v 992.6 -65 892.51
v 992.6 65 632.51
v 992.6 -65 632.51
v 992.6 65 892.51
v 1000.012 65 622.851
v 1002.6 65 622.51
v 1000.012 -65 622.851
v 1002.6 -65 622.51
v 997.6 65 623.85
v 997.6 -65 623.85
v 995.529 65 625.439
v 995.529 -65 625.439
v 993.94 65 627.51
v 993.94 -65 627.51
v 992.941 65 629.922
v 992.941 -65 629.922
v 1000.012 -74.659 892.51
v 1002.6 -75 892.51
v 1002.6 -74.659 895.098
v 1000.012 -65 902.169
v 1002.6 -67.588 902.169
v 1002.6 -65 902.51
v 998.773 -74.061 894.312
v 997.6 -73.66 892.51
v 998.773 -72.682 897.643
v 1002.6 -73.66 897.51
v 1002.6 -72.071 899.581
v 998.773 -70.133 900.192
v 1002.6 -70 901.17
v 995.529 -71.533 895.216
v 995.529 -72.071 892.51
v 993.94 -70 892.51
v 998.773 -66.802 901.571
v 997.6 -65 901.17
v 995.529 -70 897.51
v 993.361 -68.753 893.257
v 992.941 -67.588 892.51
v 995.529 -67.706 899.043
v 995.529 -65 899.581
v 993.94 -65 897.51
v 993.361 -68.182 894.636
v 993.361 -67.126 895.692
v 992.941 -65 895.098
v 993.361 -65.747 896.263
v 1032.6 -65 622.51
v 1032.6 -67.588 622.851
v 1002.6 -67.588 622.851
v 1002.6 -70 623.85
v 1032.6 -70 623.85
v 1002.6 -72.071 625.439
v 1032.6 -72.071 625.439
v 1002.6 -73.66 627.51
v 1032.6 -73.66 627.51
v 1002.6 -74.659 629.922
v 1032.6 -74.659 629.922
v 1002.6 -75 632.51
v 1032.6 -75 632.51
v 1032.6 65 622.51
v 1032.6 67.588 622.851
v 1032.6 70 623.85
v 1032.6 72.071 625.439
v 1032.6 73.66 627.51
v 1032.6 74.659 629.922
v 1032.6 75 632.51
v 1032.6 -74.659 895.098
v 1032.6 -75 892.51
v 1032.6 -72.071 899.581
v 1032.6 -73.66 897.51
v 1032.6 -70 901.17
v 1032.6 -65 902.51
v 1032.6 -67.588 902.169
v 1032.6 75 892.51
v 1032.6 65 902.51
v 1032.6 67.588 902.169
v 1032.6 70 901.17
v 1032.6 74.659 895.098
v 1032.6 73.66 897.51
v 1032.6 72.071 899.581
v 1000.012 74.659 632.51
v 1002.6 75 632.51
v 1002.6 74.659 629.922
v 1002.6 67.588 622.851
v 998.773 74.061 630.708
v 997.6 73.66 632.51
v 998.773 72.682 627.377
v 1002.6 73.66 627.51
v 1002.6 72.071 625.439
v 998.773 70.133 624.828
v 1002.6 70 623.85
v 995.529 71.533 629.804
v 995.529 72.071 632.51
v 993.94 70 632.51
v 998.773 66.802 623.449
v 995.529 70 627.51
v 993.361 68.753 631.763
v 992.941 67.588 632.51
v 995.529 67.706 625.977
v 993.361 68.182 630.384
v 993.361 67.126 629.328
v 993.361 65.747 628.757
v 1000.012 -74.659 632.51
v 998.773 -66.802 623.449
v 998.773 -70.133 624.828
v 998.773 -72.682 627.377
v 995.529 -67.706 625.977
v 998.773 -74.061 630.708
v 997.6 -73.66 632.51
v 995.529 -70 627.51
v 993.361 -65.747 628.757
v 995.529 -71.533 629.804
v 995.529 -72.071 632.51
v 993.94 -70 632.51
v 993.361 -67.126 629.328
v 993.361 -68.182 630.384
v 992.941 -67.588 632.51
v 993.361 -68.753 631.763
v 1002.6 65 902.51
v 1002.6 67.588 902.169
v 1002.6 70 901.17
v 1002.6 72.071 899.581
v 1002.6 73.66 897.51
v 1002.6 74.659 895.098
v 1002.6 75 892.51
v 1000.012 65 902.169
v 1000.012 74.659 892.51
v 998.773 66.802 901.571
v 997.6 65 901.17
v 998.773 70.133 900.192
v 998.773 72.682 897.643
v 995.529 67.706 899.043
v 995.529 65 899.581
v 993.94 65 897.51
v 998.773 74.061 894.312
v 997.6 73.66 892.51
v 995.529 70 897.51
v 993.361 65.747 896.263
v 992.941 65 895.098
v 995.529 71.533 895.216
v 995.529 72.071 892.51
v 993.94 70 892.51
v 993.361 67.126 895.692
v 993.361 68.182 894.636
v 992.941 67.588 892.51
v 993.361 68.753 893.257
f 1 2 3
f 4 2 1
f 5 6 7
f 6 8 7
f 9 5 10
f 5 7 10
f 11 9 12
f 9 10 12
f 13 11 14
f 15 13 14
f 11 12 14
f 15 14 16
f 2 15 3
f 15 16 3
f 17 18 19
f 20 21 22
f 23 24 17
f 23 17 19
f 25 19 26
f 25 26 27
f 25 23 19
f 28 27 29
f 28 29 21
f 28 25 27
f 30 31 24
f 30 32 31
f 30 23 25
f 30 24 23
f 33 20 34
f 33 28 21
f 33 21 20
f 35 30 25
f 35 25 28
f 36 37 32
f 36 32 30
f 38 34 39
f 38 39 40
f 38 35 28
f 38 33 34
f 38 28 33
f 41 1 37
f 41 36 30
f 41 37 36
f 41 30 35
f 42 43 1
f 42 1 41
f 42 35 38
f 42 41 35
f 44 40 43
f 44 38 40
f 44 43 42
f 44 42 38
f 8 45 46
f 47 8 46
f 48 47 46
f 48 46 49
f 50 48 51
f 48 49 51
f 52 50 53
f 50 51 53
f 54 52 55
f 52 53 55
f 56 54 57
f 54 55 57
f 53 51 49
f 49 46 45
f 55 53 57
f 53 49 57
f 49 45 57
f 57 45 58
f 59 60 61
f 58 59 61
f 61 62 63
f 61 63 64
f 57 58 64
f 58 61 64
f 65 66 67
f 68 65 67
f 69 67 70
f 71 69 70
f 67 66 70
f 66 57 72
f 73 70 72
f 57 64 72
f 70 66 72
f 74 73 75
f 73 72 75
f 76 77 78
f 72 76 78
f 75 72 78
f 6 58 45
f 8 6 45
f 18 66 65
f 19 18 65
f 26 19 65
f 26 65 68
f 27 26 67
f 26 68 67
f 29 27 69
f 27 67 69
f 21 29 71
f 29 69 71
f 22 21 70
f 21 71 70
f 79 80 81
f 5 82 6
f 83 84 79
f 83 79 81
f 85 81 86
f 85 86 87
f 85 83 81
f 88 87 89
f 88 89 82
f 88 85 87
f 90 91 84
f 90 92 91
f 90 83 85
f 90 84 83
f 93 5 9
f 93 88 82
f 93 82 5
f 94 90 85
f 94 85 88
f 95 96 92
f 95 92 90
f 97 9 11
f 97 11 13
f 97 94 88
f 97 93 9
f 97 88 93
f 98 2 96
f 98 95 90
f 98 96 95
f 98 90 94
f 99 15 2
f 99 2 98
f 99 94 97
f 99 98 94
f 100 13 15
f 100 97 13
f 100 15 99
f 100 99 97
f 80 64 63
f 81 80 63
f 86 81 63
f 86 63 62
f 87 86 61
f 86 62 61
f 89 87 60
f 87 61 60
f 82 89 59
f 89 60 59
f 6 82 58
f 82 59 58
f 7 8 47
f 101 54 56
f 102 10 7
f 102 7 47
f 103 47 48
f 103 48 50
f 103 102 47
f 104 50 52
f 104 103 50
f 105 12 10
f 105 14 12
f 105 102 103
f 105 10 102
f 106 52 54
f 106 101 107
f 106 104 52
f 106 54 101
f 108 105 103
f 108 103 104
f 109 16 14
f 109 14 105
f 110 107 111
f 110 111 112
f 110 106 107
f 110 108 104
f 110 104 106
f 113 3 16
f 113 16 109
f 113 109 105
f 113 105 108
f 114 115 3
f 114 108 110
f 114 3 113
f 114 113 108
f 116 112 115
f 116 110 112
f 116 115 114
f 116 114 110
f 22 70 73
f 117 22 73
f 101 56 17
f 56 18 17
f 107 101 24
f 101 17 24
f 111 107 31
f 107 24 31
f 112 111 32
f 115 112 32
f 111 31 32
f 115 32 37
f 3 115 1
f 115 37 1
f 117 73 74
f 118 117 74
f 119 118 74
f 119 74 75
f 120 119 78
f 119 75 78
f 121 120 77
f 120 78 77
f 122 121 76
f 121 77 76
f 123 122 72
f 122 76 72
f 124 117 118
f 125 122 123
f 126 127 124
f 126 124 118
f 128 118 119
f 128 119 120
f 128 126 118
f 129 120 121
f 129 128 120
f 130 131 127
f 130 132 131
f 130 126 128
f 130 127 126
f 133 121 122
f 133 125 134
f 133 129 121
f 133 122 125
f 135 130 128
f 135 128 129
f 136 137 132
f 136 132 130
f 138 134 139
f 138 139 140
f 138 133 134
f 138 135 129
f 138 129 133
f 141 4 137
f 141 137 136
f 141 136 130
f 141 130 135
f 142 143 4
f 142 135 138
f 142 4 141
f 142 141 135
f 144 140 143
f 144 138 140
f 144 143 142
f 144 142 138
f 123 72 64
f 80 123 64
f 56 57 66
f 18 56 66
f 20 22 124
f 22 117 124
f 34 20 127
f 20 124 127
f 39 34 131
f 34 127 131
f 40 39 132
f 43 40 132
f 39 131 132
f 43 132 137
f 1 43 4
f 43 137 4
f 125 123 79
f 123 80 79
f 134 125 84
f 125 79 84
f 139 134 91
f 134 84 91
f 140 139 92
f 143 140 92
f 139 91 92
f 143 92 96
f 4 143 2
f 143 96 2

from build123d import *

# Parameters (mm, degrees)
DODANIE_WYCI_GNI_CIE1_DEPTH = 40
ZAOKR_GLENIE1_R             = 10


with BuildPart() as part:
    # Szkic1 → Dodanie-wyciągnięcie1 (new body)
    with BuildSketch(Plane.ZY.offset(-1032.6)):
        with BuildLine():
            Line((622.51, 65), (622.51, -65))
            ThreePointArc((622.51, -65), (625.438932188, -72.071067812), (632.51, -75))
            Line((632.51, -75), (892.51, -75))
            ThreePointArc((892.51, -75), (899.581067812, -72.071067812), (902.51, -65))
            Line((902.51, -65), (902.51, 65))
            ThreePointArc((902.51, 65), (899.581067812, 72.071067812), (892.51, 75))
            Line((892.51, 75), (632.51, 75))
            ThreePointArc((632.51, 75), (625.438932188, 72.071067812), (622.51, 65))
        make_face()
    extrude(amount=DODANIE_WYCI_GNI_CIE1_DEPTH)

    # Zaokrąglenie1
    zaokr_glenie1_edges = [part.edges().sort_by_distance(p)[0] for p in [
        (992.6, -72.071067812, 625.438932188),
        (992.6, -75, 762.51),
        (992.6, -72.071067812, 899.581067812),
        (992.6, 0, 902.51),
        (992.6, 72.071067812, 899.581067812),
        (992.6, 75, 762.51),
        (992.6, 72.071067812, 625.438932188),
        (992.6, 0, 622.51),
    ]]
    fillet(zaokr_glenie1_edges, radius=ZAOKR_GLENIE1_R)


solid = part.part
